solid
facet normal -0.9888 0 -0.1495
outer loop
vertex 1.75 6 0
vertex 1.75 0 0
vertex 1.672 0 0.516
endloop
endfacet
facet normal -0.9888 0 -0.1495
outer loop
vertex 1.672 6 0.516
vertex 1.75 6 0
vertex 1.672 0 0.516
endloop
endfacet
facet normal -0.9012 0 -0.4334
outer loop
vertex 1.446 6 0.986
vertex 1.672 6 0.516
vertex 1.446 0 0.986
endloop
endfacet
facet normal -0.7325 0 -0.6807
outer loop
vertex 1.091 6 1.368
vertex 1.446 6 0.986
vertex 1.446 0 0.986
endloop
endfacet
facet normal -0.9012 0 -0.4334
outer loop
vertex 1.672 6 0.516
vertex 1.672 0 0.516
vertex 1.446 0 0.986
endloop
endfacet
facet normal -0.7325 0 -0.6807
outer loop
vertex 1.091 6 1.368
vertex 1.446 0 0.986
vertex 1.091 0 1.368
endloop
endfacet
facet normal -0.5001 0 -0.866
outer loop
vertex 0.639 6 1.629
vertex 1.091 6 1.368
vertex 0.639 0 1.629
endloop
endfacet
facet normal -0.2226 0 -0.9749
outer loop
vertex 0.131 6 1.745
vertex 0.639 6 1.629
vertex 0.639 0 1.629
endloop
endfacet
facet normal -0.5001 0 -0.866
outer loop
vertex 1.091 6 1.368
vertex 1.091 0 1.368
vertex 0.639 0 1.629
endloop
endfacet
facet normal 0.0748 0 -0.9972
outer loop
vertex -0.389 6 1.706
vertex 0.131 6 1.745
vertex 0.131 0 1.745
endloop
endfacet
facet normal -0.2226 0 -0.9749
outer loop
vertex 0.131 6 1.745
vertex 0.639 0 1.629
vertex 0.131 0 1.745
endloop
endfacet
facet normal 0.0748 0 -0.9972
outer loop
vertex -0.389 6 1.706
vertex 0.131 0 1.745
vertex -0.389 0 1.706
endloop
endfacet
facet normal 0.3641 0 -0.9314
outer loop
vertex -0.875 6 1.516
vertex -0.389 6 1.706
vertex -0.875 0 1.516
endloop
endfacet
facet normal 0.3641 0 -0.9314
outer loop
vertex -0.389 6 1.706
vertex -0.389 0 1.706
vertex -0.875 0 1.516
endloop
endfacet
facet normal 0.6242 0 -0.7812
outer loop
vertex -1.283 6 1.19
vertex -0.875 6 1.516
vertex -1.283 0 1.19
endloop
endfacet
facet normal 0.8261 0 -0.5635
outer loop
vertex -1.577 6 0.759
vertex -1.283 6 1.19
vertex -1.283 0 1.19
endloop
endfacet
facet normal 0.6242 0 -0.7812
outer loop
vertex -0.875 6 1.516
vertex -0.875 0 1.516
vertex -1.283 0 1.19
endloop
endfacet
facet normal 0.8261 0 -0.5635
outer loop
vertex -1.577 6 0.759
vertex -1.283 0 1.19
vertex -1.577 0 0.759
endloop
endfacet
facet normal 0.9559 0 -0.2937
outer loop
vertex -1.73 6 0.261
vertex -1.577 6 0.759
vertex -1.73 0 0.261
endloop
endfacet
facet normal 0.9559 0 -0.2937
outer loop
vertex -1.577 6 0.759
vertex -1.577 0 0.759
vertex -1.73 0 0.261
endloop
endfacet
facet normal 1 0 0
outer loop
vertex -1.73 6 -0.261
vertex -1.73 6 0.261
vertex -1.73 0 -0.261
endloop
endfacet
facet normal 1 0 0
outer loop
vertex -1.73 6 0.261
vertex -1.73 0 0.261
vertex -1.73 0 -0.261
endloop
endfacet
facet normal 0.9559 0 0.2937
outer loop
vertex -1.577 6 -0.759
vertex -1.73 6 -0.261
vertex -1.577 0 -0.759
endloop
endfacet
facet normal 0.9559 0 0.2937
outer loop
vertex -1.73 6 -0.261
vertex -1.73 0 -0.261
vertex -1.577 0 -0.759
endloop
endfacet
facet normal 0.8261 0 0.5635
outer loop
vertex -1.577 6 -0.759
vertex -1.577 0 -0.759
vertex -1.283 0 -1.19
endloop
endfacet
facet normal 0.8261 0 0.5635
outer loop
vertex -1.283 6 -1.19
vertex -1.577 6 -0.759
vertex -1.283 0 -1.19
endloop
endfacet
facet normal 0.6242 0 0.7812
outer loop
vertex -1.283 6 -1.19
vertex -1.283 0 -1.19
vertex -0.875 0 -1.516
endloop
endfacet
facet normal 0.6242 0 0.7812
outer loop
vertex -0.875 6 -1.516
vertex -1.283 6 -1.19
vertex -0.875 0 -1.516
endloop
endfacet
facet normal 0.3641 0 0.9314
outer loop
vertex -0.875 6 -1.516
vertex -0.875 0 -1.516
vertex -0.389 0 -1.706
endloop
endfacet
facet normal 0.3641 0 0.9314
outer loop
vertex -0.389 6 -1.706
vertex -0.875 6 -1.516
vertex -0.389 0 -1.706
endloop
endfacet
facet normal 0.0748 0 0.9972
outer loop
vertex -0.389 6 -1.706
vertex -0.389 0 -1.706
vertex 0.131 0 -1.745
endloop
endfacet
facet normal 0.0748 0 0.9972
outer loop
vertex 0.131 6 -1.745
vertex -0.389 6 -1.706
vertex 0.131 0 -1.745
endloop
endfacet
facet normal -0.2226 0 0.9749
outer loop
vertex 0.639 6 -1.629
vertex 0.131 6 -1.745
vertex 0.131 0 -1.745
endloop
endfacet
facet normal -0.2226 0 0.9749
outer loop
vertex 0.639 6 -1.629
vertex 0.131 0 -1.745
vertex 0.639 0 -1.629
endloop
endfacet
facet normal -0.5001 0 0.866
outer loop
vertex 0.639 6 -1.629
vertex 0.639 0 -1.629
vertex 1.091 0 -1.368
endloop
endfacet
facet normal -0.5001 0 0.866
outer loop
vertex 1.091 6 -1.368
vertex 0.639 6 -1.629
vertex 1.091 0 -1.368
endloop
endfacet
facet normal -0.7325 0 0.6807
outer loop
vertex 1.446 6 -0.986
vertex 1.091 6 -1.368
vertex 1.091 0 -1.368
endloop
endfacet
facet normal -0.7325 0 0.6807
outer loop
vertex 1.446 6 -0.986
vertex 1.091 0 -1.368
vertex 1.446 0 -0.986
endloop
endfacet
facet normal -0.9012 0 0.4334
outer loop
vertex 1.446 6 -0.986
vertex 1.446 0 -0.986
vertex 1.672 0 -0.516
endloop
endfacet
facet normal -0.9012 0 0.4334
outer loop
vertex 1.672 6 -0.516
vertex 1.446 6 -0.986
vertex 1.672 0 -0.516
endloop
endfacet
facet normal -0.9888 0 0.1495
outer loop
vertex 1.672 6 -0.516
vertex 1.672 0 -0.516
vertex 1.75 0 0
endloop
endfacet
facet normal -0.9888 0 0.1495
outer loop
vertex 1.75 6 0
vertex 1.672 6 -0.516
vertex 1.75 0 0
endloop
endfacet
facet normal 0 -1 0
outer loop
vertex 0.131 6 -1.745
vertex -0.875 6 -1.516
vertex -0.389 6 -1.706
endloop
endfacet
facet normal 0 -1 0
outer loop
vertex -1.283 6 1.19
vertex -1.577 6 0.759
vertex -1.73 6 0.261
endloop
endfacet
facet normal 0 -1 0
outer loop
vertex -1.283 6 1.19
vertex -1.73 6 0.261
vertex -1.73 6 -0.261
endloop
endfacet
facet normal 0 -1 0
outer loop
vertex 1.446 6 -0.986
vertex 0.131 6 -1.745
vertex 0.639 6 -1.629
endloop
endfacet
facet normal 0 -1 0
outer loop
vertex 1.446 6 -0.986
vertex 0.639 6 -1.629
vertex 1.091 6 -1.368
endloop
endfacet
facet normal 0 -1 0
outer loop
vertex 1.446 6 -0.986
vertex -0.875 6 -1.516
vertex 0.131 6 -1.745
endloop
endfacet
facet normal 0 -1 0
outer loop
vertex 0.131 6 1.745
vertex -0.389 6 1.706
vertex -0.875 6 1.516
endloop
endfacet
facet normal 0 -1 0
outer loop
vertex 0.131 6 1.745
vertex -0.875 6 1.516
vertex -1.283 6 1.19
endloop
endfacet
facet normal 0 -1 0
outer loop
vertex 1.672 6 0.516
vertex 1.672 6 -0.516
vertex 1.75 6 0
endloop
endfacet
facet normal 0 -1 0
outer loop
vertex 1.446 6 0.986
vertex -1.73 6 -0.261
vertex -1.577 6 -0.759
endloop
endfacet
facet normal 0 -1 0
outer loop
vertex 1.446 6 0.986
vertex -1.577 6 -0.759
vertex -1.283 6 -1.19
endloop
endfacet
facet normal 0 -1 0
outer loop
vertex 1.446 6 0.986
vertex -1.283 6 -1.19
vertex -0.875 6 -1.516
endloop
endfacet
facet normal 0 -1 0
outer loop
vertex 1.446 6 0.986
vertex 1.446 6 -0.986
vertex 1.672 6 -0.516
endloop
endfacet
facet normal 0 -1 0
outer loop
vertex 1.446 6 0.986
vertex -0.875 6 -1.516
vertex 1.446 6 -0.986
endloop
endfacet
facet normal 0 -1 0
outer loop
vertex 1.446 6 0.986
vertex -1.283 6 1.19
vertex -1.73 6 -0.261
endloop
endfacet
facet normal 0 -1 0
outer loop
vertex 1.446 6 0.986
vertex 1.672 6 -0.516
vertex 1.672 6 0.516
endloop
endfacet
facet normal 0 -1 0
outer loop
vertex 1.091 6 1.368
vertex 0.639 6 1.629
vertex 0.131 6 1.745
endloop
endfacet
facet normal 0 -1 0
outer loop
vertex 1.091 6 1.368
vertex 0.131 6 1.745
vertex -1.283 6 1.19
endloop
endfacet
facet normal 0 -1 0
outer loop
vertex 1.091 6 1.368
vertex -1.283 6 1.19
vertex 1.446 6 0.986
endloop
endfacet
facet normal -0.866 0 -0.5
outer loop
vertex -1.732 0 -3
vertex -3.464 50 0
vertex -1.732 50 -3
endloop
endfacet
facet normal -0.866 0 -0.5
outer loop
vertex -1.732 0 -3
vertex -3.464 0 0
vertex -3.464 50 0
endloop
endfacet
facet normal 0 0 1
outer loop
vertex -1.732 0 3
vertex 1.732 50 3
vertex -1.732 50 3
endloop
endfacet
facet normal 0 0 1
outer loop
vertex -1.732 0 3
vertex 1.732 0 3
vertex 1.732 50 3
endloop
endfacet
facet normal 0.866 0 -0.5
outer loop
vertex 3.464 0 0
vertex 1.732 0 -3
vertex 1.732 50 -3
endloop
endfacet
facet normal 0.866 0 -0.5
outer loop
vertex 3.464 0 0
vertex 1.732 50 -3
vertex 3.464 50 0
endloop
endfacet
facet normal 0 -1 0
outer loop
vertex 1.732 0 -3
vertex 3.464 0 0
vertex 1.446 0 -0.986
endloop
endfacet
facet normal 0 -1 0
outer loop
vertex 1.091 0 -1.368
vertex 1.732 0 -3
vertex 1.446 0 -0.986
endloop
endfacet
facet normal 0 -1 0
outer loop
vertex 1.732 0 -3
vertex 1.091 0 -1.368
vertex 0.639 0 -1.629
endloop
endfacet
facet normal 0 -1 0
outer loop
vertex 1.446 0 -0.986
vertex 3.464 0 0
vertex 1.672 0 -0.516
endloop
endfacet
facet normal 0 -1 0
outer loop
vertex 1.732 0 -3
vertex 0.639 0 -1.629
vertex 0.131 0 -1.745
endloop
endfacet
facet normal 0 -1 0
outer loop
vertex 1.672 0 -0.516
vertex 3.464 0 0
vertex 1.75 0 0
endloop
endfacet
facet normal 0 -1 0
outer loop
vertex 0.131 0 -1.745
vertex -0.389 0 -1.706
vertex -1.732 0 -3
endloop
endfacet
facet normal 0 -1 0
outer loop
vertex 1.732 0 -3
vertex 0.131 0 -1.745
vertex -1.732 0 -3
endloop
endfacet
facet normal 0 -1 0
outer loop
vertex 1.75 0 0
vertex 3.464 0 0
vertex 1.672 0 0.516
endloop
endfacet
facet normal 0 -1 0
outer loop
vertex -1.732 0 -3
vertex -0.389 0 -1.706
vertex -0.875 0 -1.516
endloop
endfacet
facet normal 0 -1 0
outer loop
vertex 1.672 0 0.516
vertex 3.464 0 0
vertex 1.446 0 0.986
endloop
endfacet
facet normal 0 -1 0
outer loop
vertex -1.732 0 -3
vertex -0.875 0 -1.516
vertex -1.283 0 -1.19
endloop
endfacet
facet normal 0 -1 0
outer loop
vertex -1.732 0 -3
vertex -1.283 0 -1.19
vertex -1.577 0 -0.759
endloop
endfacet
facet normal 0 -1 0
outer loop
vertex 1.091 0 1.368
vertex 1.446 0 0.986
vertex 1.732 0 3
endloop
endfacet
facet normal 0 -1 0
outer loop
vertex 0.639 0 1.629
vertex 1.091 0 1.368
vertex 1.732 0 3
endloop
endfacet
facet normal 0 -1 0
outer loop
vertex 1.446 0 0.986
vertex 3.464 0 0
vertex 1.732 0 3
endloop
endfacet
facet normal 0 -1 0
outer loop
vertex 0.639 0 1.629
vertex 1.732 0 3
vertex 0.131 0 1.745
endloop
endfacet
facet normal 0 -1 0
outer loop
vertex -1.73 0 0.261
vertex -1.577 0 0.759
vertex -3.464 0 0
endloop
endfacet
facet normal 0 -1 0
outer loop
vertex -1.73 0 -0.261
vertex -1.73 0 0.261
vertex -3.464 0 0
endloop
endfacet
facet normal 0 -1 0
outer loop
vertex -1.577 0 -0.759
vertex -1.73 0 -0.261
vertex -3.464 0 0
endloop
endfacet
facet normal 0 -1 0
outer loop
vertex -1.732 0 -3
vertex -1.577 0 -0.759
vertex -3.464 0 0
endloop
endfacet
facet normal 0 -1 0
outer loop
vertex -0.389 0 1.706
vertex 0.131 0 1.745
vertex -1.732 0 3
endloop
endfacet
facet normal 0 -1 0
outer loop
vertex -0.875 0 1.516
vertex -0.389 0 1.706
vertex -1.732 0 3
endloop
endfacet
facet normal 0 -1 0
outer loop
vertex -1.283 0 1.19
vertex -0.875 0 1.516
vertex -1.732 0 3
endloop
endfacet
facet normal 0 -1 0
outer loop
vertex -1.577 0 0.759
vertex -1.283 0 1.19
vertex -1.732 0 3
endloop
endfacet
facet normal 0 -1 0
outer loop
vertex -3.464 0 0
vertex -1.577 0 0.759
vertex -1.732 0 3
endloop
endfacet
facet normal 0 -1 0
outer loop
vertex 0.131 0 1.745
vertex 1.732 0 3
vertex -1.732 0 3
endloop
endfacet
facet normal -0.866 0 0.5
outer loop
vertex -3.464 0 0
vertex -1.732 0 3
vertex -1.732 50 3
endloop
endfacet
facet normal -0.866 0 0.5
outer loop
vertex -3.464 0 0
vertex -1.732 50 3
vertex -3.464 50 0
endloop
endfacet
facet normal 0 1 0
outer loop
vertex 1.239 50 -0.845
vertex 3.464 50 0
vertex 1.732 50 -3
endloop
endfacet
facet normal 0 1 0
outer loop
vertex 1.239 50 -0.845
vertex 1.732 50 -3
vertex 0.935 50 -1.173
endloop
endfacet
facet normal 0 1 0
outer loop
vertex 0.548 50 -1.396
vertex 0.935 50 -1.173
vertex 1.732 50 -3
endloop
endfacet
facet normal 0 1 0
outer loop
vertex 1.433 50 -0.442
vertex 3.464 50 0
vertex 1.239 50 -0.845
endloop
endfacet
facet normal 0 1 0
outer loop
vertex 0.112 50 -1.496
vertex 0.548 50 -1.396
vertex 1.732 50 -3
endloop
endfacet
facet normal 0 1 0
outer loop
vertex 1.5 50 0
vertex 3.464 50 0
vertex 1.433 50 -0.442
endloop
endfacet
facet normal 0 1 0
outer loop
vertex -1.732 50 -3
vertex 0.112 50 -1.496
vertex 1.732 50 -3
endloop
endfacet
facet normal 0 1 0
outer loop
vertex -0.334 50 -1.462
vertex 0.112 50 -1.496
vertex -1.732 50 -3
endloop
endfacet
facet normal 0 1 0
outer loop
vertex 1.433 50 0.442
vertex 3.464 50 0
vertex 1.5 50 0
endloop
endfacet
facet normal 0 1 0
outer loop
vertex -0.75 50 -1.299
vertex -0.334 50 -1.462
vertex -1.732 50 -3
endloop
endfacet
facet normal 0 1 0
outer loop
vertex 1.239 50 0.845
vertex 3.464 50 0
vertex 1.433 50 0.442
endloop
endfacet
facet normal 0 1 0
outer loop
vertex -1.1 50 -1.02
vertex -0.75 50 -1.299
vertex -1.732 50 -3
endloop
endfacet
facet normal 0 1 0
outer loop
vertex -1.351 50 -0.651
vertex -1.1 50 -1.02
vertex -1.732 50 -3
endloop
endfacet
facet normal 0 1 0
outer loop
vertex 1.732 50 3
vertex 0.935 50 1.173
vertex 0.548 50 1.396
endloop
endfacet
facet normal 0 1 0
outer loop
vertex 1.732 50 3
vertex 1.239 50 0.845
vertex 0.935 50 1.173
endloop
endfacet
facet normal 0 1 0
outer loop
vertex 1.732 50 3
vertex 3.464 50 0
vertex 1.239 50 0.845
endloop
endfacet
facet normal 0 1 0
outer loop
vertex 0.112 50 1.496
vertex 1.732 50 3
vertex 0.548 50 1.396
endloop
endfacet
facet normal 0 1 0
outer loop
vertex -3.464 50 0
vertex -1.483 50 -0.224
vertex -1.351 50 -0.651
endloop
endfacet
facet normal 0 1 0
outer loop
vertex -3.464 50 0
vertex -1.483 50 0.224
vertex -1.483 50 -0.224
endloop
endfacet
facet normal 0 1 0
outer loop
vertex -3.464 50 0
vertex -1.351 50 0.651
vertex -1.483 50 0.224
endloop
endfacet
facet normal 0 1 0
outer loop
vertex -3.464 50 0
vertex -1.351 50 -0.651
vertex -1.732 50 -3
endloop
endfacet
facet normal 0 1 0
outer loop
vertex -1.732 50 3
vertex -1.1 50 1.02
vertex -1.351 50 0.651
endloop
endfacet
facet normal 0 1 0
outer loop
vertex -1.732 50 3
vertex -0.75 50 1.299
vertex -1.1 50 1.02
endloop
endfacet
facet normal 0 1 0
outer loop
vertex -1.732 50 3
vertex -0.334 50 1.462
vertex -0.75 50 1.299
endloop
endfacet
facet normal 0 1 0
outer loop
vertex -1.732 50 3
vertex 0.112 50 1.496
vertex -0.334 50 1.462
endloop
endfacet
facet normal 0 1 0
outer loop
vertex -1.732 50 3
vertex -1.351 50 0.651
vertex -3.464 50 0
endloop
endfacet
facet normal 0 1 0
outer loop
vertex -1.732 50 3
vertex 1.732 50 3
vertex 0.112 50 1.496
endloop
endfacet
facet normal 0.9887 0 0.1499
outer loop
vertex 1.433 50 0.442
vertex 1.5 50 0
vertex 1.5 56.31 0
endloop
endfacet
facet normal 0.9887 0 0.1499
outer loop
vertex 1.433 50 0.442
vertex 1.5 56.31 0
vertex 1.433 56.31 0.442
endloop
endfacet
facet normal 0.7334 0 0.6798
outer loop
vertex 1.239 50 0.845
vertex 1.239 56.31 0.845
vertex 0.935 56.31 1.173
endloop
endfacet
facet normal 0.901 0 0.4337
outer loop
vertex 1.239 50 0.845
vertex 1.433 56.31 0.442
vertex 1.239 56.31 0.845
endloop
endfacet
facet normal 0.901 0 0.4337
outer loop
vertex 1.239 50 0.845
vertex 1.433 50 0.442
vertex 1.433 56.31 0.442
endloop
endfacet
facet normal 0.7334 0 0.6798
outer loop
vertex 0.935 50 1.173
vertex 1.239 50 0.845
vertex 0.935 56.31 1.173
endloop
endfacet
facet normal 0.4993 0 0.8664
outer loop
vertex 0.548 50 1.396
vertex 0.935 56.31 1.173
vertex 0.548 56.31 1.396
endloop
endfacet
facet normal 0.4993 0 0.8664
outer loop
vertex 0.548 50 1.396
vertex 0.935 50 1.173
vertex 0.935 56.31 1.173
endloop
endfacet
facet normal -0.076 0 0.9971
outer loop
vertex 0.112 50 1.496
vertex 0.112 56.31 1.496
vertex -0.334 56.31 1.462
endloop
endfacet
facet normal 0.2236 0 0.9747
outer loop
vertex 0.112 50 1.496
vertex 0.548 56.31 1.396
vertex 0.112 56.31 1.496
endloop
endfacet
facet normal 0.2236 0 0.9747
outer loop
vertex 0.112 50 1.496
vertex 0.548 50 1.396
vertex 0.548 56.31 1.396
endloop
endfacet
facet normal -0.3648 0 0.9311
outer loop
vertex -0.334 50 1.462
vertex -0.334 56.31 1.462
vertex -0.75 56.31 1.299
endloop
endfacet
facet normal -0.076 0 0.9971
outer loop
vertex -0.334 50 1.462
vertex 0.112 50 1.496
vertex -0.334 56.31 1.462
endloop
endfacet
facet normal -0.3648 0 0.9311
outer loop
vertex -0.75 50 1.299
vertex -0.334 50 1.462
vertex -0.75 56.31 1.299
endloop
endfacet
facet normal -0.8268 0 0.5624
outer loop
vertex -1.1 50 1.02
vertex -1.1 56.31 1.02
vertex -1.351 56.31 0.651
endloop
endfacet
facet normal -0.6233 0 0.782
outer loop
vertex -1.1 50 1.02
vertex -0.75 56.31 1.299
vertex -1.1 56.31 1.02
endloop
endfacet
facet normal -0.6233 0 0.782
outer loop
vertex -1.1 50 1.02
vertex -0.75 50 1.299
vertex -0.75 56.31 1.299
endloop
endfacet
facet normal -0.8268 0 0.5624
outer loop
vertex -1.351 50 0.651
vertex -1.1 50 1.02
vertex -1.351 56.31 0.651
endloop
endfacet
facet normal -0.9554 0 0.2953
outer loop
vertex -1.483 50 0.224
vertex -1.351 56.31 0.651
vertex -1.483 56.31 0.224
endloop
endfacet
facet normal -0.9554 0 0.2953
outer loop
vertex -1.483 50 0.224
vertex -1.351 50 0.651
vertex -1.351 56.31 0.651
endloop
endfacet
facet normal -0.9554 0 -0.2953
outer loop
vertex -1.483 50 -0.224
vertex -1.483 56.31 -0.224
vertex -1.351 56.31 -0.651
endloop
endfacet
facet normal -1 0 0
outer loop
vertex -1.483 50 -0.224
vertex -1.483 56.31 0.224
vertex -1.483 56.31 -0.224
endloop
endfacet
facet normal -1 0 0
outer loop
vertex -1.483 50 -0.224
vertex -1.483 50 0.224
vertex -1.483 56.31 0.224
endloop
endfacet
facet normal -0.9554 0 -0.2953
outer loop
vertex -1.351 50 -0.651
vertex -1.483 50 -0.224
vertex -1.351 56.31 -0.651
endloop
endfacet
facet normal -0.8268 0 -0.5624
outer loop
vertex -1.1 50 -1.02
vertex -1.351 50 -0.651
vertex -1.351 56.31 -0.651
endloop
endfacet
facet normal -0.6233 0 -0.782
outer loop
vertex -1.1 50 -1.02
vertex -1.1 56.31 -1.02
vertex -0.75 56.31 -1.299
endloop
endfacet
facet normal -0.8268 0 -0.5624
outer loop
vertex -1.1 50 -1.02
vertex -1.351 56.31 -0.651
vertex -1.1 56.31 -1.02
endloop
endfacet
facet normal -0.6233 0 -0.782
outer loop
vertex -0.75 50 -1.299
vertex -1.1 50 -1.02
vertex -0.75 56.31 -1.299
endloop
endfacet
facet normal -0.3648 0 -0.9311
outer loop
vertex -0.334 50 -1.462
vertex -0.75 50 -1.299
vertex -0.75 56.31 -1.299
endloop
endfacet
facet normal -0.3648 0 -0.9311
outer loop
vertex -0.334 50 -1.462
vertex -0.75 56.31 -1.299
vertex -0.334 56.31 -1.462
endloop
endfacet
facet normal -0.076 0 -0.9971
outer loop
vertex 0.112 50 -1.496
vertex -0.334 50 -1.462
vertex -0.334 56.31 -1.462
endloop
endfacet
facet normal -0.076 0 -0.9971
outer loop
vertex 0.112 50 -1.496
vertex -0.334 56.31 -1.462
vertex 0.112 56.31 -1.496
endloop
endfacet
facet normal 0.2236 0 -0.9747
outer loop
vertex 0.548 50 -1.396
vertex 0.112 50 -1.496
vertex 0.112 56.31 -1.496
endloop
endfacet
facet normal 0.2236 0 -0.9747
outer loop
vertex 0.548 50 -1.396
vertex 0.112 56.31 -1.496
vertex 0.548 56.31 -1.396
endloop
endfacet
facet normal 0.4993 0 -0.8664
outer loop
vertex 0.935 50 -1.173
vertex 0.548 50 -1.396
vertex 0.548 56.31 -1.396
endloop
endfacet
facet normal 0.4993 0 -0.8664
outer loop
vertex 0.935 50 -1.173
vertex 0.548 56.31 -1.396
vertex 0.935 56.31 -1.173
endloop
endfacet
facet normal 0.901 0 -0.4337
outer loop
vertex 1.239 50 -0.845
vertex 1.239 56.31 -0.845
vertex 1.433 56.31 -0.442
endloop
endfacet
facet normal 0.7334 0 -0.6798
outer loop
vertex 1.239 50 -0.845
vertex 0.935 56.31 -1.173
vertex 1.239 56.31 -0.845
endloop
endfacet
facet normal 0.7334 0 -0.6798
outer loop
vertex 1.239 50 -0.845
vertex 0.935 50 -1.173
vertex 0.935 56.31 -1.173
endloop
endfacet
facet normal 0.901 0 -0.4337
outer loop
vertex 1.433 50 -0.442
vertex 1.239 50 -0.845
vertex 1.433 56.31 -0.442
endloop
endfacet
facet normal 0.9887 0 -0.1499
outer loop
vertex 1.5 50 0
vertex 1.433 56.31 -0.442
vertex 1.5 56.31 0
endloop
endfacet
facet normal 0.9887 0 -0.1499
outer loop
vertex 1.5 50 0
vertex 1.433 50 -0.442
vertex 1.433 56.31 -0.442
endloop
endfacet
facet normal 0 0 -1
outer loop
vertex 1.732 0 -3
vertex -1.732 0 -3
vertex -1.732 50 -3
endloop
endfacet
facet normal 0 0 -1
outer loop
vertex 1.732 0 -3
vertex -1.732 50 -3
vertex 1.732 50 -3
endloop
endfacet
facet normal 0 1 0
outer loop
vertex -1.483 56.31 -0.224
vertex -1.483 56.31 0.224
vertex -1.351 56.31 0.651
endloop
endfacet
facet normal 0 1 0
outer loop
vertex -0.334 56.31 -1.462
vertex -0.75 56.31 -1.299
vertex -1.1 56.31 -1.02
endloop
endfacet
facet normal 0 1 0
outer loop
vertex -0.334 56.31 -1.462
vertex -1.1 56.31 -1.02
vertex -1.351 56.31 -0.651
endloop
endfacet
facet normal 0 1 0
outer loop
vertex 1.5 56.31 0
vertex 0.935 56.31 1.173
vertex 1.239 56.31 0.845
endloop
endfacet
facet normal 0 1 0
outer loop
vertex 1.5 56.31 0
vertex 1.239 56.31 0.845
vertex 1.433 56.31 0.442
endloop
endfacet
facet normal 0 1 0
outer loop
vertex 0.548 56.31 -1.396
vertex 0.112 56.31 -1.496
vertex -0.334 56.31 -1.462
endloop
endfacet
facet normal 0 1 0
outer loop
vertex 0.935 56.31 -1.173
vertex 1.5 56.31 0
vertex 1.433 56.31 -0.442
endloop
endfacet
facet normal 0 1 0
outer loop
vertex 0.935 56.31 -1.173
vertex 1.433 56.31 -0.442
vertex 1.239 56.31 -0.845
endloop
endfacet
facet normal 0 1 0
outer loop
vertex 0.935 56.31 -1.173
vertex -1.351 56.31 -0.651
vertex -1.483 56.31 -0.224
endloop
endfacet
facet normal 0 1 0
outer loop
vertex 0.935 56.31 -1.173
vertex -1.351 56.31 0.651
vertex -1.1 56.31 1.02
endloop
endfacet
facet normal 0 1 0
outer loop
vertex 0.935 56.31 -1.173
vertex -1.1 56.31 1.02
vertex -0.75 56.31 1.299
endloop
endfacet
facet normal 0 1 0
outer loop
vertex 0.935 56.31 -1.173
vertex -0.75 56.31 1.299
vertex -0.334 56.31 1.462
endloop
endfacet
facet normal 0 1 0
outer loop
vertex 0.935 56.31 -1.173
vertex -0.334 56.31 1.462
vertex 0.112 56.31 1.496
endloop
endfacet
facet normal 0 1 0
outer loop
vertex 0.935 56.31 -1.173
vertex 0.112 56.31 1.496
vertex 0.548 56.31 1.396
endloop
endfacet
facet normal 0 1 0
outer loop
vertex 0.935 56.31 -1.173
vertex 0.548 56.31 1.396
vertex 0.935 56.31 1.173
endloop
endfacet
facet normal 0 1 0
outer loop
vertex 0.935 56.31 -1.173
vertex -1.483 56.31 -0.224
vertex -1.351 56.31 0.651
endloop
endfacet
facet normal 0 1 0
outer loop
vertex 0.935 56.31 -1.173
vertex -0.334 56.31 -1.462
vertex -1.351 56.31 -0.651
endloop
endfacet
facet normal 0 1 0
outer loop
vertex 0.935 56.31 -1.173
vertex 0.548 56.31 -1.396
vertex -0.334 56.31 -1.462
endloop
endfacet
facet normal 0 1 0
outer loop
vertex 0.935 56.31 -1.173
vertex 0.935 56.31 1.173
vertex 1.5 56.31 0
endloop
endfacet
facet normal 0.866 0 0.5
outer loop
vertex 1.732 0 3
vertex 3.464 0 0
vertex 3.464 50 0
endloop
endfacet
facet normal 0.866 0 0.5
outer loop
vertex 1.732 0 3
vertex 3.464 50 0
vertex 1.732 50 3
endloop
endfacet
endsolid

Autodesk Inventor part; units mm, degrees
ref_plane "YZ Plane" through (0, 0, 0) normal (1, 0, 0) x (0, 1, 0)
ref_plane "XZ Plane" through (0, 0, 0) normal (0, 1, 0) x (-1, 0, 0)
ref_plane "XY Plane" through (0, 0, 0) normal (0, 0, 1) x (1, 0, 0)
sketch "Sketch1" plane through (0, 0, 0) normal (0, 1, 0) x (-1, 0, 0)
  line L0 (-3.4641, 0) -> (-1.7321, 3)
  line L1 (-1.7321, 3) -> (1.7321, 3)
  line L2 (1.7321, 3) -> (3.4641, 0)
  line L3 (3.4641, 0) -> (1.7321, -3)
  line L4 (1.7321, -3) -> (-1.7321, -3)
  line L5 (-1.7321, -3) -> (-3.4641, 0)
  point P0 (0, 0)
  point P1 (0, 0)
  dimension "d1" = 6
extrude "Extrusion1" add sketch "Sketch1" along normal blind 50
sketch "Sketch2" plane through (0, 0, 0) normal (0, -1, 0) x (1, 0, 0)
  circle A0 centre (0, 0) radius 1.75
  dimension "d4" = 3.5
sketch "Sketch3" plane through (0, 50, 0) normal (0, 1, 0) x (1, 0, 0)
  circle A0 centre (0, 0) radius 1.5
  dimension "d5" = 3
extrude "Extrusion2" add sketch "Sketch3" along normal blind 6.31
extrude "Extrusion3" cut sketch "Sketch2" against normal blind 6
thread "Thread1" size "M3x0.35" class "6g" standard "ANSI Metric M Profile" full length
thread "Thread2" size "M4x0.5" class "6H" standard "ANSI Metric M Profile" full length
properties part number "spacer5cm"
